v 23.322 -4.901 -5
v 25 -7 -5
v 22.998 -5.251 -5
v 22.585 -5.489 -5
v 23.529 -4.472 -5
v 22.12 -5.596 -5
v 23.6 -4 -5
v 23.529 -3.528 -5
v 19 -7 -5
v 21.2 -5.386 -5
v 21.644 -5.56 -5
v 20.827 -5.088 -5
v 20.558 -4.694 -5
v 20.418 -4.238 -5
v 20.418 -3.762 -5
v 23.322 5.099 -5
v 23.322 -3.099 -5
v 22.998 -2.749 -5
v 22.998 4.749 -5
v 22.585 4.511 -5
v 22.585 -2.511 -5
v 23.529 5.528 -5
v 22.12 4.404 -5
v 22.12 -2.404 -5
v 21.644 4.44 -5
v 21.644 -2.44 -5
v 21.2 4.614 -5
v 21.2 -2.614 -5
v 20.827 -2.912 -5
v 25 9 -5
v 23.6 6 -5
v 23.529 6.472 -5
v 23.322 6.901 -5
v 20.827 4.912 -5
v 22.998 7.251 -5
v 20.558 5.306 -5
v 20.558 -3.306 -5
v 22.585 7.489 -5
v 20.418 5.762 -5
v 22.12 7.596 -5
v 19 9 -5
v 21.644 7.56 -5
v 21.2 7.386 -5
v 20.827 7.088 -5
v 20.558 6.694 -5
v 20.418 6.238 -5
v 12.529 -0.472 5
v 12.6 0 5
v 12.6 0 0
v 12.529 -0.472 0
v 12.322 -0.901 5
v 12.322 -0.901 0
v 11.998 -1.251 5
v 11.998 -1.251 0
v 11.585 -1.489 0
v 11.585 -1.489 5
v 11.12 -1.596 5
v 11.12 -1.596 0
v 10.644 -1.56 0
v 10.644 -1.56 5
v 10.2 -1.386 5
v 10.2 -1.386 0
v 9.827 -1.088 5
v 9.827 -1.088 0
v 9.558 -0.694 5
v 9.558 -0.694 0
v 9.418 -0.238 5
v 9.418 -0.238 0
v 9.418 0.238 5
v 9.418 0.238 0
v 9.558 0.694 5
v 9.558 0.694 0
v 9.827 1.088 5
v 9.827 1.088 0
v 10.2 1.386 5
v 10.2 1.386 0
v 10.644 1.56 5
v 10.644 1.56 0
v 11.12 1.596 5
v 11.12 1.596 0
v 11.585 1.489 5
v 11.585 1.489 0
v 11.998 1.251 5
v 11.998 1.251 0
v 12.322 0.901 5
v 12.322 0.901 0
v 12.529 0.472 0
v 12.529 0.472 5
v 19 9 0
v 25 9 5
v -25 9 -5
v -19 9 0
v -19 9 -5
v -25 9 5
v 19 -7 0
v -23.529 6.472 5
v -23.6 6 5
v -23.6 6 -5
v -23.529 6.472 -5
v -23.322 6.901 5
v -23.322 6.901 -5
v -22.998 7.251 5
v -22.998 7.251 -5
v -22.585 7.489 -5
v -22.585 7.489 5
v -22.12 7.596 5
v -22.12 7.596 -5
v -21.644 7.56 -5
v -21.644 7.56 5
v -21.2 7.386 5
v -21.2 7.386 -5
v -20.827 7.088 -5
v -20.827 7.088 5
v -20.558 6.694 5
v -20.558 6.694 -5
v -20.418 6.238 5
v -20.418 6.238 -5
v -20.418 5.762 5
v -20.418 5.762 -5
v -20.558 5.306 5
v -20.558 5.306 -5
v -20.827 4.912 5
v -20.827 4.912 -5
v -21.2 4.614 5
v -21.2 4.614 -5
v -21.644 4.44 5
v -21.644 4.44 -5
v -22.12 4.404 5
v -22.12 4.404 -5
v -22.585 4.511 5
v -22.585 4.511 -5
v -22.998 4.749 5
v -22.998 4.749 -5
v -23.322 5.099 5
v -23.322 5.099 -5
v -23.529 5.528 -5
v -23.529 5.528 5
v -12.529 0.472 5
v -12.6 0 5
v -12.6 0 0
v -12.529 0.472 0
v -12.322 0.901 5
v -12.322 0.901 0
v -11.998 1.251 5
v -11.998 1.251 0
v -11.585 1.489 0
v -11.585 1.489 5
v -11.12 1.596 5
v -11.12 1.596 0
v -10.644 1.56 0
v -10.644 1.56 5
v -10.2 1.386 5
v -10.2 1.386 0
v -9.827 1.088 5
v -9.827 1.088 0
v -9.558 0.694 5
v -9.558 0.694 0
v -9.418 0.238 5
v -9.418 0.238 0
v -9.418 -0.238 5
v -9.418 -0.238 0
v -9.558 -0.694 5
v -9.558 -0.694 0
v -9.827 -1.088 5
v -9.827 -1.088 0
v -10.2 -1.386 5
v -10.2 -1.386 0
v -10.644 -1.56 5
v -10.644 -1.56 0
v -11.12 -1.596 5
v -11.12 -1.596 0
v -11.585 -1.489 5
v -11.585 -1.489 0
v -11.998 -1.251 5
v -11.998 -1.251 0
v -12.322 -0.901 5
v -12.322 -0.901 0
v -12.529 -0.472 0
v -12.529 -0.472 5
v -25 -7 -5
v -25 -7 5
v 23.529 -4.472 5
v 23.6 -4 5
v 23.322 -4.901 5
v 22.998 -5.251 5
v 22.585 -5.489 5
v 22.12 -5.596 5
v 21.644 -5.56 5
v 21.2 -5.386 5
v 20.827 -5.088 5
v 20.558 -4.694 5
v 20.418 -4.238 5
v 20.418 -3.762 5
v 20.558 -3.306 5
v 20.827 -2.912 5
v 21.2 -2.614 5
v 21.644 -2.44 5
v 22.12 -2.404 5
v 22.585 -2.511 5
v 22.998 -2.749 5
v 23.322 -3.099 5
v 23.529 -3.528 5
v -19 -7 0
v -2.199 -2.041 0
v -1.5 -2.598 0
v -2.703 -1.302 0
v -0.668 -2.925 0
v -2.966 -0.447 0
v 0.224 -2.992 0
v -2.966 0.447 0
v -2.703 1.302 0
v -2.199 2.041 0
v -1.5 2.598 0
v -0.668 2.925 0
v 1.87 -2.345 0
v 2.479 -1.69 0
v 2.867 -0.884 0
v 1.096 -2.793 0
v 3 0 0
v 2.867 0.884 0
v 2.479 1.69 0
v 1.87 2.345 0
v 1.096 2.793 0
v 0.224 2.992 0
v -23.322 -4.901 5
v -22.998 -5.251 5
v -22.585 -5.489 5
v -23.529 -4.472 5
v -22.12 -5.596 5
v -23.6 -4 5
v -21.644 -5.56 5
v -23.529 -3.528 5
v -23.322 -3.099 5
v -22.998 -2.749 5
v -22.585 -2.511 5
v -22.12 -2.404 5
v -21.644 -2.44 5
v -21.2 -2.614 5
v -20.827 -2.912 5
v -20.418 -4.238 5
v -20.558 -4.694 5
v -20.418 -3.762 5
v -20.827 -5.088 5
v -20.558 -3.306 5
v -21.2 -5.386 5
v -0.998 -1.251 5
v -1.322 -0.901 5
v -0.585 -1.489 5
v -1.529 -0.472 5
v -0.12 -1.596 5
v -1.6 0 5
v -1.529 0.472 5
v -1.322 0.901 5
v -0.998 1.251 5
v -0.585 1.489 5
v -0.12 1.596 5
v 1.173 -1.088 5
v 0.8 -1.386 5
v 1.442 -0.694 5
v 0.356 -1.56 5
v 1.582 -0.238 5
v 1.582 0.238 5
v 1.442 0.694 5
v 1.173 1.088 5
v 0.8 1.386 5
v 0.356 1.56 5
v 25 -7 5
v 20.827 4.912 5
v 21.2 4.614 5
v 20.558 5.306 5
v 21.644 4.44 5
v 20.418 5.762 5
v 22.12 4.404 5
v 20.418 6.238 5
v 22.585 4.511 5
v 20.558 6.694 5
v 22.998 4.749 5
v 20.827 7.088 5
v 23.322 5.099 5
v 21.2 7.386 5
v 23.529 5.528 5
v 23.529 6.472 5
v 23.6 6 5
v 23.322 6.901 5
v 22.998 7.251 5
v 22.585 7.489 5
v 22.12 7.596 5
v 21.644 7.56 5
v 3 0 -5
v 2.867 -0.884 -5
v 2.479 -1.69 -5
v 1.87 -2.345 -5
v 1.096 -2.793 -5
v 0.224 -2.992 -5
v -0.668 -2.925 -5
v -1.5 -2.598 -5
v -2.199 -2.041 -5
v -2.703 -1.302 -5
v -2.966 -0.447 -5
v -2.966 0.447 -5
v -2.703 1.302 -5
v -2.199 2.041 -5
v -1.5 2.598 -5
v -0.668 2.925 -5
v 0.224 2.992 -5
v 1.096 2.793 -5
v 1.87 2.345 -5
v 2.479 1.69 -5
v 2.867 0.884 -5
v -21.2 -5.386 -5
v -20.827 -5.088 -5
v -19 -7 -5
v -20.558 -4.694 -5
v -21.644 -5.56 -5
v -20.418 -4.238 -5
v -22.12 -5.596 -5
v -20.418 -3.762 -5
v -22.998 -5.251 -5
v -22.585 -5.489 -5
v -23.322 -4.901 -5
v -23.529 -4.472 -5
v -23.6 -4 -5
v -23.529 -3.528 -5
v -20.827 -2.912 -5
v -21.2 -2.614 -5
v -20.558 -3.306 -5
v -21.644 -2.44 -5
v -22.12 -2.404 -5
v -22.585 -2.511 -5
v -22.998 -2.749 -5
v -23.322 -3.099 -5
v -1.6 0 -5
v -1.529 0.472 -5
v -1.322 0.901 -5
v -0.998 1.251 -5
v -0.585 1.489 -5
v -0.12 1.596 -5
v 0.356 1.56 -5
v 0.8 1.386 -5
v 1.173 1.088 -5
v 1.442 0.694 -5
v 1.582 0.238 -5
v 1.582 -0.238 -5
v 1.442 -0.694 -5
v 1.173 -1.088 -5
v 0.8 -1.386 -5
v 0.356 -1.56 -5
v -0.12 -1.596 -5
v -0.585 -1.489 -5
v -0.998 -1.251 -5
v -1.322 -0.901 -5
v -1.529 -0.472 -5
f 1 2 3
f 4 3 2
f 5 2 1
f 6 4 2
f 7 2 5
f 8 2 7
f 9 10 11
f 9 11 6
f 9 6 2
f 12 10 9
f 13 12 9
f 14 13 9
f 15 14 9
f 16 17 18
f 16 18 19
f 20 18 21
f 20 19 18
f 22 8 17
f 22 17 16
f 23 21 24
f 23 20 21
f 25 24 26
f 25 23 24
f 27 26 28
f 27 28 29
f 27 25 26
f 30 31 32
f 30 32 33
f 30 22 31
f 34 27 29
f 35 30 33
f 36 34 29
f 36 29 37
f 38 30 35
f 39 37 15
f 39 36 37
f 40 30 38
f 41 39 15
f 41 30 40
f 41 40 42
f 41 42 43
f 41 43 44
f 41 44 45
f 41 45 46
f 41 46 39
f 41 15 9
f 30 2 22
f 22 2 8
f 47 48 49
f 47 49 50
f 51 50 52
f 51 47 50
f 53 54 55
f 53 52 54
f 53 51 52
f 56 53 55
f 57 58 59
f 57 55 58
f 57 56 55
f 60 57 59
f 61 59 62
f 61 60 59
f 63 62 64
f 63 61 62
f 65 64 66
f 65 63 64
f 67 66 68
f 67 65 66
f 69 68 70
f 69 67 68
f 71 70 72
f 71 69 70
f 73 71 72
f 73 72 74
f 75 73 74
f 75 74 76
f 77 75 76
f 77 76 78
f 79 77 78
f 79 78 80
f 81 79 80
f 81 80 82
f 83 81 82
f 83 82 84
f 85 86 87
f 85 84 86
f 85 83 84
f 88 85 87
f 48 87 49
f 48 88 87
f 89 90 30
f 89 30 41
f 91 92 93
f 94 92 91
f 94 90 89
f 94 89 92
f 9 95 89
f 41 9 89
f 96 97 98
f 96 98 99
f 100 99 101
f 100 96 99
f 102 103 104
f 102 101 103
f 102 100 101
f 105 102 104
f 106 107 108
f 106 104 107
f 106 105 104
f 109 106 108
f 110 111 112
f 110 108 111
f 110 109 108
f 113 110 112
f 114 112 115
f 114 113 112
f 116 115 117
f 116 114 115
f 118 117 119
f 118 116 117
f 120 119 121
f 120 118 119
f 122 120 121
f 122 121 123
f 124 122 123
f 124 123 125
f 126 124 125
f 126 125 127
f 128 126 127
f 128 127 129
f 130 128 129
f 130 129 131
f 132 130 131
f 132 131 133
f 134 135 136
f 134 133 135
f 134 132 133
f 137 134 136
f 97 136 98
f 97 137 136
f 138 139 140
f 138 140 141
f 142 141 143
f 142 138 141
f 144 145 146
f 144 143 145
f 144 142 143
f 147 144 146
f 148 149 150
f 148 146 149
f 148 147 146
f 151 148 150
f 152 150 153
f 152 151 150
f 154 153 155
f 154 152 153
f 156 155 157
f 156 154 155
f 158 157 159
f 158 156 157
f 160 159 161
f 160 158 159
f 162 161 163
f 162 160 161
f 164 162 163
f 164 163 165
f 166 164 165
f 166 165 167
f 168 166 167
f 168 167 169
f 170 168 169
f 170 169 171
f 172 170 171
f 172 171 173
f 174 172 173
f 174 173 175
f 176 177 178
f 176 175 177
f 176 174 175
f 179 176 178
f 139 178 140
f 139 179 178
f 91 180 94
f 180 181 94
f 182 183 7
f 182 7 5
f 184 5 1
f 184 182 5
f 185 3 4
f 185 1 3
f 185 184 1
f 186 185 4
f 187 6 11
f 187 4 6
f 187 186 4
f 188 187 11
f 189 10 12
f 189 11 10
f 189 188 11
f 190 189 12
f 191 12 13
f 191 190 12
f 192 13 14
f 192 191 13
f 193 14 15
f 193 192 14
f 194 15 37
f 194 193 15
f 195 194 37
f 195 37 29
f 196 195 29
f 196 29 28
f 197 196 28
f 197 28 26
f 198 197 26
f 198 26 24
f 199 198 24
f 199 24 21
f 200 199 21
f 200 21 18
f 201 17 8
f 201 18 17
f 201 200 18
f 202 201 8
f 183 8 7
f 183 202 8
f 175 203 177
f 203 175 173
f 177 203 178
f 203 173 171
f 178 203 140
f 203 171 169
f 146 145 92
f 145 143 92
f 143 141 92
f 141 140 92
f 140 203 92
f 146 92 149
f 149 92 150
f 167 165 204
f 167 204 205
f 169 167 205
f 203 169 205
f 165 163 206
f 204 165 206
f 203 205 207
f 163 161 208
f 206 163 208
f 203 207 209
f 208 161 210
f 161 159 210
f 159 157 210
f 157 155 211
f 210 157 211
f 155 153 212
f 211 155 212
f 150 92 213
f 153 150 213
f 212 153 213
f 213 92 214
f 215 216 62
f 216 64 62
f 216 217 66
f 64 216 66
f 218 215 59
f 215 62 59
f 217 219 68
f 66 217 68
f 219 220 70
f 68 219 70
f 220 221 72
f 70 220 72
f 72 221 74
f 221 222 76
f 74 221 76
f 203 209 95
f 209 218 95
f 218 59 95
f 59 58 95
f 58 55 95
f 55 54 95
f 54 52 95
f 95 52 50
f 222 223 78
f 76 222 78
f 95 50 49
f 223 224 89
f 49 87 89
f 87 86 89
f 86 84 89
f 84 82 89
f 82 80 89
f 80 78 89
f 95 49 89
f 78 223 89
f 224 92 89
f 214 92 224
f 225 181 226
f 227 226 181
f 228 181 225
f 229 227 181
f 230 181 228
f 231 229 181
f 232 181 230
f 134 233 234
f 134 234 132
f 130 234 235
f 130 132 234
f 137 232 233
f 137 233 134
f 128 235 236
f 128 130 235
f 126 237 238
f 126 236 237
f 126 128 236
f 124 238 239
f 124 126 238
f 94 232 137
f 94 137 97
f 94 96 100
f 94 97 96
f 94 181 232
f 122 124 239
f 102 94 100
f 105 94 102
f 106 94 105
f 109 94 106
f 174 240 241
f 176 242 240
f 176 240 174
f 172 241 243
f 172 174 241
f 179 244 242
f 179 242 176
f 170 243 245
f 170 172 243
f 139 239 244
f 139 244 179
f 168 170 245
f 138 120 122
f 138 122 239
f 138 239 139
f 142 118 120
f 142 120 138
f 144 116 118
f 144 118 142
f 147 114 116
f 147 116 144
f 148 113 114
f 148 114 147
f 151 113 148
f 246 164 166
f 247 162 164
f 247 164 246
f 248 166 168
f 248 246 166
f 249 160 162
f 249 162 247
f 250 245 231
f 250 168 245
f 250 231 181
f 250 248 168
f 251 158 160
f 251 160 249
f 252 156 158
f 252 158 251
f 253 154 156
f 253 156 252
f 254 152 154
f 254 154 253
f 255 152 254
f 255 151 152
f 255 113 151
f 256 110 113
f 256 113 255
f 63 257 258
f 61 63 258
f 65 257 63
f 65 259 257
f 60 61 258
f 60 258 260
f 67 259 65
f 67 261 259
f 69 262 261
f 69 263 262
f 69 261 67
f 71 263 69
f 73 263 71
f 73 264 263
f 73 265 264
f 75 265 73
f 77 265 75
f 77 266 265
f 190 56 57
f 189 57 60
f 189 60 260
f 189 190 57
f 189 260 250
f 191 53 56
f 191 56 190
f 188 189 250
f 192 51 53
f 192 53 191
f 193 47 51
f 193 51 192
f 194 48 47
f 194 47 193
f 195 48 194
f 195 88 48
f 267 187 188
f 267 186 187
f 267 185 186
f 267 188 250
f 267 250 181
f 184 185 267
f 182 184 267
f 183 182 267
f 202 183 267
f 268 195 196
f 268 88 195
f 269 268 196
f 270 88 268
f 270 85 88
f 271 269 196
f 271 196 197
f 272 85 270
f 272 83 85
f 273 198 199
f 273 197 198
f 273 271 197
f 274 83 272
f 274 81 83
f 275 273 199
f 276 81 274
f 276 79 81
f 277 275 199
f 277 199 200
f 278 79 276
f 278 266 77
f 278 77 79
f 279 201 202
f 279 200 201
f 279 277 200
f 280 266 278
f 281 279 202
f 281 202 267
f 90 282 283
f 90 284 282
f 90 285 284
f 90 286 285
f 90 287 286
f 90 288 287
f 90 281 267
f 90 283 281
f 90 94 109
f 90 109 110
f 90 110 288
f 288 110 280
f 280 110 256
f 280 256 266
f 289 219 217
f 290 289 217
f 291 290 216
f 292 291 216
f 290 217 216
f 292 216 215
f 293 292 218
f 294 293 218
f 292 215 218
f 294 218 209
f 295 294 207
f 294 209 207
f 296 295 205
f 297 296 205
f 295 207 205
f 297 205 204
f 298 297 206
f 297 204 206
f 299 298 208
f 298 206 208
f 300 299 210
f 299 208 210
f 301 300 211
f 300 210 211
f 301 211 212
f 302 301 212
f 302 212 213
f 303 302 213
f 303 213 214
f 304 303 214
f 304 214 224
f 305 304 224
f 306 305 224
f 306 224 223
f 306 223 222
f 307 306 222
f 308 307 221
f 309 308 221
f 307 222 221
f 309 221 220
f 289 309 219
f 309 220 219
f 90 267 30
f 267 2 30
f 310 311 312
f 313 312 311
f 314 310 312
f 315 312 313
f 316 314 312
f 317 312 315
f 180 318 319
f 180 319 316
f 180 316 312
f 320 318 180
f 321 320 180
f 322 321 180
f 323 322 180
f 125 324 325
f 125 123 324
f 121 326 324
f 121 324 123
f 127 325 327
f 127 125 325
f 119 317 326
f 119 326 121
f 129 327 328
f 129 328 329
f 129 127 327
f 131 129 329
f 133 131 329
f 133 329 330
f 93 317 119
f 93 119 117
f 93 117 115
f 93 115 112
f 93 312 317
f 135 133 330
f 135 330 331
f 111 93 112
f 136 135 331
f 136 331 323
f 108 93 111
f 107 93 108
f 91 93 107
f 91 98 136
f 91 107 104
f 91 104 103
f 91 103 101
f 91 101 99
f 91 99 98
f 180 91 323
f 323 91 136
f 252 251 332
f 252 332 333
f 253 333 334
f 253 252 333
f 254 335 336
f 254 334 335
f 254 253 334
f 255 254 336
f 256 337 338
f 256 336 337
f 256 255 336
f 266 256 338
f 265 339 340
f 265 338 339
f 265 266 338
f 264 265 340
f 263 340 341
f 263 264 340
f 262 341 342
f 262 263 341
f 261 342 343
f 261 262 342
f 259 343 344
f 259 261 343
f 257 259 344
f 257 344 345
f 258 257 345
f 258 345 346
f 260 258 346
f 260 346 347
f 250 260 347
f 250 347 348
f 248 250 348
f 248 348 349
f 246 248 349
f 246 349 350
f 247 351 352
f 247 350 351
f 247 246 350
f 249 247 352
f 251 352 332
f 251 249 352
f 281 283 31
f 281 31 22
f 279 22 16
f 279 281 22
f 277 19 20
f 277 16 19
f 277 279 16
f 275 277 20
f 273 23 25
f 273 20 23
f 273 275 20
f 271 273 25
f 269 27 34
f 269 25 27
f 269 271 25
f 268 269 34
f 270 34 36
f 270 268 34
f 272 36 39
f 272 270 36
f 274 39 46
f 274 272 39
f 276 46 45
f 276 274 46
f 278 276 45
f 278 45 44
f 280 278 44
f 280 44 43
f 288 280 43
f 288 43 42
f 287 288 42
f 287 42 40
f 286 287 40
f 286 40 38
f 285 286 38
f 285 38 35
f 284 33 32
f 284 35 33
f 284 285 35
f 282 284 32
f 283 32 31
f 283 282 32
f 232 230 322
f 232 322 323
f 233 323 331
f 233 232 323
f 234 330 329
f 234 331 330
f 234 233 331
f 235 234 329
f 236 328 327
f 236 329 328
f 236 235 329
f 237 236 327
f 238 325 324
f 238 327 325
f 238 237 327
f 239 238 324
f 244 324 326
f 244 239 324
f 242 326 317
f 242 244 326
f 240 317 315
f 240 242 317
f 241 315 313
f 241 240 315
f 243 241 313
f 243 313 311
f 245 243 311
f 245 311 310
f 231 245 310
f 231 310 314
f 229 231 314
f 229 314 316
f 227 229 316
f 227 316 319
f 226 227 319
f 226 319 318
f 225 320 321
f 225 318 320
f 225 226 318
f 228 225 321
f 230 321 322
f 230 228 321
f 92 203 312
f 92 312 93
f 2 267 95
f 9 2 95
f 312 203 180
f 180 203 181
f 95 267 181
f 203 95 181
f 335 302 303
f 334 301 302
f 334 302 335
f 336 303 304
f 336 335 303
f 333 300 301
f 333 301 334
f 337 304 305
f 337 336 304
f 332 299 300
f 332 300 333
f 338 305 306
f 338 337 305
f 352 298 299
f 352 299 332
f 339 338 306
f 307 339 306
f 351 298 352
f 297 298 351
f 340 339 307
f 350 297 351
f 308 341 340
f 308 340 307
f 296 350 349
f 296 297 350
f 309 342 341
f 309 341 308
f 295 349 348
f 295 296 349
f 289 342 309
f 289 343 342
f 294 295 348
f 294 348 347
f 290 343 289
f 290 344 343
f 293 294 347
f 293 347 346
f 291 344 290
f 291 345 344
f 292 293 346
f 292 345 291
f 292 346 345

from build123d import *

# Parameters (mm, degrees)
SKETCH1_W               = 50
SKETCH1_H               = 16
BOSS_EXTRUDE1_DEPTH     = 5
SKETCH2_R               = 3
SKETCH2_W               = 6
SKETCH2_H               = 16
BOSS_EXTRUDE2_DEPTH     = 5
CUT_EXTRUDE1_DEPTH      = 28.037011669
CUT_EXTRUDE1_DEPTH_BACK = 28.037011669
SKETCH3_R               = 1.6


with BuildPart() as part:
    # Sketch1 → Boss-Extrude1 (new body)
    with BuildSketch(Plane.XY):
        with Locations((0, 1)):
            Rectangle(SKETCH1_W, SKETCH1_H)
    extrude(amount=BOSS_EXTRUDE1_DEPTH)

    # Sketch2 → Boss-Extrude2 (add)
    with BuildSketch(Plane(origin=(0, 0, 0), x_dir=(-1, 0, 0), z_dir=(0, 0, -1))):
        with Locations(Location((0, 0, 0), (0, 0, 180))):
            Circle(SKETCH2_R)
        with Locations((22, 1)):
            Rectangle(SKETCH2_W, SKETCH2_H)
        with Locations((-22, 1)):
            Rectangle(SKETCH2_W, SKETCH2_H)
    extrude(amount=BOSS_EXTRUDE2_DEPTH)

    # Sketch3 → Cut-Extrude1 (cut, two sides: drawn at the far end of the back side and taken through both)
    with BuildSketch(Plane(origin=(0, 0, 0), x_dir=(-1, 0, 0), z_dir=(0, 0, -1)).offset(-CUT_EXTRUDE1_DEPTH_BACK)):
        Circle(SKETCH3_R)
        with Locations((11, 0)):
            Circle(SKETCH3_R)
        with Locations((22, -4)):
            Circle(SKETCH3_R)
        with Locations((22, 6)):
            Circle(SKETCH3_R)
        with Locations(Location((-22, 6, 0), (0, 0, 180))):
            Circle(SKETCH3_R)
        with Locations(Location((-22, -4, 0), (0, 0, 180))):
            Circle(SKETCH3_R)
        with Locations(Location((-11, 0, 0), (0, 0, 180))):
            Circle(SKETCH3_R)
    extrude(amount=CUT_EXTRUDE1_DEPTH + CUT_EXTRUDE1_DEPTH_BACK, mode=Mode.SUBTRACT)


solid = part.part
